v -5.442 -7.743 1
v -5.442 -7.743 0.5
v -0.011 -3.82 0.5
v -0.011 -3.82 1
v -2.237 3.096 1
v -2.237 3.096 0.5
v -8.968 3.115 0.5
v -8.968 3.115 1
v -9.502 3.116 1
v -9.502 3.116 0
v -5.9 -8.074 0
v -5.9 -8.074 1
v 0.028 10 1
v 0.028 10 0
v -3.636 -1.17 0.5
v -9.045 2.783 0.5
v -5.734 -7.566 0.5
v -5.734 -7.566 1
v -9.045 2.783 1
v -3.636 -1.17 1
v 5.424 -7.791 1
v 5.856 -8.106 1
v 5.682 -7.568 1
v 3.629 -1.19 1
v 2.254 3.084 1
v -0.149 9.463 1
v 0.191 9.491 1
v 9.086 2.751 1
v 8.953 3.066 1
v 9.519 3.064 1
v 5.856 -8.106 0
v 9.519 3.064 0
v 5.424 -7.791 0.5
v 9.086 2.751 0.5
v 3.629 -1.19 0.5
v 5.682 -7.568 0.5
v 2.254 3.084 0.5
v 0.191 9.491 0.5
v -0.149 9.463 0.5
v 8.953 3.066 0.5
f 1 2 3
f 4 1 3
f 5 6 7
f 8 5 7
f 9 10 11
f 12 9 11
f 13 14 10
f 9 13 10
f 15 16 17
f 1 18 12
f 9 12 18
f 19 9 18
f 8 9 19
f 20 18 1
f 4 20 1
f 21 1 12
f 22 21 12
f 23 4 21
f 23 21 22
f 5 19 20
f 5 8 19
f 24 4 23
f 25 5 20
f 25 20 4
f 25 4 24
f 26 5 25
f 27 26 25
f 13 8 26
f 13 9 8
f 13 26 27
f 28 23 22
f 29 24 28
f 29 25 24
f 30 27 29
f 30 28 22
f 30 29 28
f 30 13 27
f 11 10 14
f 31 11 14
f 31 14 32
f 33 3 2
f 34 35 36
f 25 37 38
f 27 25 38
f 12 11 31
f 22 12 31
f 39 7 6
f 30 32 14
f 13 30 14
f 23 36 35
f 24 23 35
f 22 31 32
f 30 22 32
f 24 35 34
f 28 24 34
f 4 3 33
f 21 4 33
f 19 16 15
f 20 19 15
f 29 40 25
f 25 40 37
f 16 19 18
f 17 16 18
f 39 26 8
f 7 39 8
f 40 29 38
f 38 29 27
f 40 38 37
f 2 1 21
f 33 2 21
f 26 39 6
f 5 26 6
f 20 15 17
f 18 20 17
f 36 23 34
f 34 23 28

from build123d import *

# Parameters (mm, degrees)
SALIENTE_EXTRUIR1_DEPTH = 1
CORTAR_EXTRUIR1_DEPTH   = 0.5
SALIENTE_EXTRUIR2_DEPTH = 0.5


with BuildPart() as part:
    # Croquis1 → Saliente-Extruir1 (new body)
    with BuildSketch(Plane.XY):
        Polygon((0.027506267, 9.99996217), (-9.502029281, 3.116318268), (-5.900083324, -8.073971561), (5.85557725, -8.106307117), (9.519029089, 3.063998239), align=None)
    extrude(amount=SALIENTE_EXTRUIR1_DEPTH)

    # Croquis2 → Cortar-Extruir1 (cut)
    with BuildSketch(Plane.XY.offset(1)):
        Polygon((0.042555256, 9.600245361), (-9.117225611, 3.00711142), (-5.677310567, -7.741748295), (5.608454716, -7.791774999), (9.143526206, 2.926166513), align=None)
    extrude(amount=-CORTAR_EXTRUIR1_DEPTH, mode=Mode.SUBTRACT)

    # Croquis3 → Saliente-Extruir2 (add)
    with BuildSketch(Plane.XY.offset(0.5)):
        Polygon((-5.900083324, -8.073971561), (-0.010506459, -3.819645663), (5.85557725, -8.106307117), (3.629452223, -1.190327659), (9.519029089, 3.063998239), (2.253631293, 3.083982712), (0.027506267, 9.99996217), (-2.236631486, 3.096333795), (-9.502029281, 3.116318268), (-3.635945572, -1.170343186), align=None)
    extrude(amount=SALIENTE_EXTRUIR2_DEPTH)


solid = part.part
